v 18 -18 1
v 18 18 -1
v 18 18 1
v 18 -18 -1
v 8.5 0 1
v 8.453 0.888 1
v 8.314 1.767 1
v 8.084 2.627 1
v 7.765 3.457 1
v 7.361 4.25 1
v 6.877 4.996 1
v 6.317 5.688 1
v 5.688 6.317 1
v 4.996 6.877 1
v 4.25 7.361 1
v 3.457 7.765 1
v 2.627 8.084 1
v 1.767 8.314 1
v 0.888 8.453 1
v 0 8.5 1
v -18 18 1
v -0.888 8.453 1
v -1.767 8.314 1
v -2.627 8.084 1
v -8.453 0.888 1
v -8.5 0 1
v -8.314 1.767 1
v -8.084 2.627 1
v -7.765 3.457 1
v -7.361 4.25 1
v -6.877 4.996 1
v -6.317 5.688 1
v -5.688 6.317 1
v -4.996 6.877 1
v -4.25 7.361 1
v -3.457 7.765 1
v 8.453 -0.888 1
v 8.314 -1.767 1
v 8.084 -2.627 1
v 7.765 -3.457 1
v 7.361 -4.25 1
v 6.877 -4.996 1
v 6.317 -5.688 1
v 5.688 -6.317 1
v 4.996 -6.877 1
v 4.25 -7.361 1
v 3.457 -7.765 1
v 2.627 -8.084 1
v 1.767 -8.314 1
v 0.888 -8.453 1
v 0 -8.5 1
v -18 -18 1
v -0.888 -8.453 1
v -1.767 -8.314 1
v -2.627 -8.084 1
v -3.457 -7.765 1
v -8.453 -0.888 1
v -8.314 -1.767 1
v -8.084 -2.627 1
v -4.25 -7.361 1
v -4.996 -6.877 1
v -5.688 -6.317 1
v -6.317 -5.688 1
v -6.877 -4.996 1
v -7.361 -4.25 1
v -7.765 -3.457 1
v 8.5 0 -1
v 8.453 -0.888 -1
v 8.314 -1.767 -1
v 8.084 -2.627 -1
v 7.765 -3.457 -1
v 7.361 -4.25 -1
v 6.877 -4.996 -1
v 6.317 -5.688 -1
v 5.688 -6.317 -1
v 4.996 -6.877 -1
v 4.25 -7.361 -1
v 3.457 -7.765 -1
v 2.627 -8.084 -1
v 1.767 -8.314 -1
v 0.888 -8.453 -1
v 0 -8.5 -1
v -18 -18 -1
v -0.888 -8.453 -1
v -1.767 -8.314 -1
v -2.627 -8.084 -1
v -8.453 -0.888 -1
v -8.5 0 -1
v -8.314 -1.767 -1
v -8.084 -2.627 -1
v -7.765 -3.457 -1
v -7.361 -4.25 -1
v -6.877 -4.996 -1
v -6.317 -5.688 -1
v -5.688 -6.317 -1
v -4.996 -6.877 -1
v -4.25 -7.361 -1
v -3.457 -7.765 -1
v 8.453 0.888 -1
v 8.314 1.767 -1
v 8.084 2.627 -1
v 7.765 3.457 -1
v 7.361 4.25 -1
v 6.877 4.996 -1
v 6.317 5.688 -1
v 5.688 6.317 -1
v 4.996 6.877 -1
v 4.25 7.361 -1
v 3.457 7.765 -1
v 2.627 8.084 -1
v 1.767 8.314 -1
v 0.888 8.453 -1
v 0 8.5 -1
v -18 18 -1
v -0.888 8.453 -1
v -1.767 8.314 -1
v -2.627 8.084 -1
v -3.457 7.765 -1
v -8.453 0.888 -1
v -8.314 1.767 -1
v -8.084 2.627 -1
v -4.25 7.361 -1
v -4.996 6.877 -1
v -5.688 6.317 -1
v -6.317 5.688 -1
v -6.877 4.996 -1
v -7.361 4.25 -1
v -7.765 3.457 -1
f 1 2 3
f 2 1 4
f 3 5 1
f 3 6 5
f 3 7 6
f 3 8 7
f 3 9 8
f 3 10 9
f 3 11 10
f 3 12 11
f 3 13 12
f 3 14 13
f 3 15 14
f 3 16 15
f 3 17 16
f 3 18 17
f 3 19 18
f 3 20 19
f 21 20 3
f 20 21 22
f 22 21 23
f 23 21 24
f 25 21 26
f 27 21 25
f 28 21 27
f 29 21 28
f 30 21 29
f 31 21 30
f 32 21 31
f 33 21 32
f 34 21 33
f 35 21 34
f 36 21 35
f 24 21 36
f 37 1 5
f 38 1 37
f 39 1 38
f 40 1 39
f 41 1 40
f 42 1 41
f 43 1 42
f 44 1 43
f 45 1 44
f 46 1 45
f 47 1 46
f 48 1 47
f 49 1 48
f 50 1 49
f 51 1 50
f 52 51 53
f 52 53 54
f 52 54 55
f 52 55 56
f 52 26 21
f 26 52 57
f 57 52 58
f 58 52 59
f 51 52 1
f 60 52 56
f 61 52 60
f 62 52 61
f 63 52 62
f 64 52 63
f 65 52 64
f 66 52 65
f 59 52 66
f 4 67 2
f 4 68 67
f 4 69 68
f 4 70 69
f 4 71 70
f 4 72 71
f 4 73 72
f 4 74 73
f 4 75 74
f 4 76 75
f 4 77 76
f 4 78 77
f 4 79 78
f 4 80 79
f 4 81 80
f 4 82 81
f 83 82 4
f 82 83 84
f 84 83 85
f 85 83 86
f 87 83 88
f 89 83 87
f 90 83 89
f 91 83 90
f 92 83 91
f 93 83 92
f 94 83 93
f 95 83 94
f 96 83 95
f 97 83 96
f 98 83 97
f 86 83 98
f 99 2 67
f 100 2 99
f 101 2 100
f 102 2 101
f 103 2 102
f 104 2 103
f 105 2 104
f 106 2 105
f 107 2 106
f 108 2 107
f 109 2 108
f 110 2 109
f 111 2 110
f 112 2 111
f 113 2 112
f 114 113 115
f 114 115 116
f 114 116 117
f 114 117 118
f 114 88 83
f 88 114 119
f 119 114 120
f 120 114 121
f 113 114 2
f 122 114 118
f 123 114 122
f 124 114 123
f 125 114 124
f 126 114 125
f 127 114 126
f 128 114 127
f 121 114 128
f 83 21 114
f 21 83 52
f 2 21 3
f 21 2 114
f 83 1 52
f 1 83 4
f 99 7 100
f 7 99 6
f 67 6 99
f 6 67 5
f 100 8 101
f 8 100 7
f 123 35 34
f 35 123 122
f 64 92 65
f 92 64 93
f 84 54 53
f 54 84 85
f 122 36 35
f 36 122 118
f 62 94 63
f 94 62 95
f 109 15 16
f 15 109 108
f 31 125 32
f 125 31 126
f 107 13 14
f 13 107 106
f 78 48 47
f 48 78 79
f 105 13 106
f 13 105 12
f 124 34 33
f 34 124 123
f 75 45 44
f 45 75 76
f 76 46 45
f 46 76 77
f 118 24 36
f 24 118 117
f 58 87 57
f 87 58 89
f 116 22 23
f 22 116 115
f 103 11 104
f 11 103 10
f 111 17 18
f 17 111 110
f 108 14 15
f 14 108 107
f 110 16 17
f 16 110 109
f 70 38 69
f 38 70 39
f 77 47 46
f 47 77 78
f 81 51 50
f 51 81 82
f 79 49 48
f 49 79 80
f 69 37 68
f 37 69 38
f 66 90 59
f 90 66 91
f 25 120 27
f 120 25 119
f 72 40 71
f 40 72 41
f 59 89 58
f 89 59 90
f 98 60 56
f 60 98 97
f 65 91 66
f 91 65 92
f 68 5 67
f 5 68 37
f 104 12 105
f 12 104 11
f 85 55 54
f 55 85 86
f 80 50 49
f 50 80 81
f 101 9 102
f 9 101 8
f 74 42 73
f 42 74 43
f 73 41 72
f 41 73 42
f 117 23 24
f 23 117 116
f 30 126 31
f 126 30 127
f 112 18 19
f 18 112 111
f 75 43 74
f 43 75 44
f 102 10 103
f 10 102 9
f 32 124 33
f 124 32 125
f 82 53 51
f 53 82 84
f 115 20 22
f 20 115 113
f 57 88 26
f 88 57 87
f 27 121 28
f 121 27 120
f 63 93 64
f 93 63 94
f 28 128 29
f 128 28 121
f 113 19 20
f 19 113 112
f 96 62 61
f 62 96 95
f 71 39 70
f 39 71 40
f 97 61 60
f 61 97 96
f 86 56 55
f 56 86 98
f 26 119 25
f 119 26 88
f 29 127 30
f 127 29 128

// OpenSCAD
// Square mounting washer.
$fn = 60;
eps = 0.02;
hole_d = 17;
side = 36;
thickness = 2;
difference() {
    cube([side,side,thickness],center=true);
    translate([0,0,-thickness/2-eps]) cylinder(d=hole_d,h=thickness+2*eps);
}
